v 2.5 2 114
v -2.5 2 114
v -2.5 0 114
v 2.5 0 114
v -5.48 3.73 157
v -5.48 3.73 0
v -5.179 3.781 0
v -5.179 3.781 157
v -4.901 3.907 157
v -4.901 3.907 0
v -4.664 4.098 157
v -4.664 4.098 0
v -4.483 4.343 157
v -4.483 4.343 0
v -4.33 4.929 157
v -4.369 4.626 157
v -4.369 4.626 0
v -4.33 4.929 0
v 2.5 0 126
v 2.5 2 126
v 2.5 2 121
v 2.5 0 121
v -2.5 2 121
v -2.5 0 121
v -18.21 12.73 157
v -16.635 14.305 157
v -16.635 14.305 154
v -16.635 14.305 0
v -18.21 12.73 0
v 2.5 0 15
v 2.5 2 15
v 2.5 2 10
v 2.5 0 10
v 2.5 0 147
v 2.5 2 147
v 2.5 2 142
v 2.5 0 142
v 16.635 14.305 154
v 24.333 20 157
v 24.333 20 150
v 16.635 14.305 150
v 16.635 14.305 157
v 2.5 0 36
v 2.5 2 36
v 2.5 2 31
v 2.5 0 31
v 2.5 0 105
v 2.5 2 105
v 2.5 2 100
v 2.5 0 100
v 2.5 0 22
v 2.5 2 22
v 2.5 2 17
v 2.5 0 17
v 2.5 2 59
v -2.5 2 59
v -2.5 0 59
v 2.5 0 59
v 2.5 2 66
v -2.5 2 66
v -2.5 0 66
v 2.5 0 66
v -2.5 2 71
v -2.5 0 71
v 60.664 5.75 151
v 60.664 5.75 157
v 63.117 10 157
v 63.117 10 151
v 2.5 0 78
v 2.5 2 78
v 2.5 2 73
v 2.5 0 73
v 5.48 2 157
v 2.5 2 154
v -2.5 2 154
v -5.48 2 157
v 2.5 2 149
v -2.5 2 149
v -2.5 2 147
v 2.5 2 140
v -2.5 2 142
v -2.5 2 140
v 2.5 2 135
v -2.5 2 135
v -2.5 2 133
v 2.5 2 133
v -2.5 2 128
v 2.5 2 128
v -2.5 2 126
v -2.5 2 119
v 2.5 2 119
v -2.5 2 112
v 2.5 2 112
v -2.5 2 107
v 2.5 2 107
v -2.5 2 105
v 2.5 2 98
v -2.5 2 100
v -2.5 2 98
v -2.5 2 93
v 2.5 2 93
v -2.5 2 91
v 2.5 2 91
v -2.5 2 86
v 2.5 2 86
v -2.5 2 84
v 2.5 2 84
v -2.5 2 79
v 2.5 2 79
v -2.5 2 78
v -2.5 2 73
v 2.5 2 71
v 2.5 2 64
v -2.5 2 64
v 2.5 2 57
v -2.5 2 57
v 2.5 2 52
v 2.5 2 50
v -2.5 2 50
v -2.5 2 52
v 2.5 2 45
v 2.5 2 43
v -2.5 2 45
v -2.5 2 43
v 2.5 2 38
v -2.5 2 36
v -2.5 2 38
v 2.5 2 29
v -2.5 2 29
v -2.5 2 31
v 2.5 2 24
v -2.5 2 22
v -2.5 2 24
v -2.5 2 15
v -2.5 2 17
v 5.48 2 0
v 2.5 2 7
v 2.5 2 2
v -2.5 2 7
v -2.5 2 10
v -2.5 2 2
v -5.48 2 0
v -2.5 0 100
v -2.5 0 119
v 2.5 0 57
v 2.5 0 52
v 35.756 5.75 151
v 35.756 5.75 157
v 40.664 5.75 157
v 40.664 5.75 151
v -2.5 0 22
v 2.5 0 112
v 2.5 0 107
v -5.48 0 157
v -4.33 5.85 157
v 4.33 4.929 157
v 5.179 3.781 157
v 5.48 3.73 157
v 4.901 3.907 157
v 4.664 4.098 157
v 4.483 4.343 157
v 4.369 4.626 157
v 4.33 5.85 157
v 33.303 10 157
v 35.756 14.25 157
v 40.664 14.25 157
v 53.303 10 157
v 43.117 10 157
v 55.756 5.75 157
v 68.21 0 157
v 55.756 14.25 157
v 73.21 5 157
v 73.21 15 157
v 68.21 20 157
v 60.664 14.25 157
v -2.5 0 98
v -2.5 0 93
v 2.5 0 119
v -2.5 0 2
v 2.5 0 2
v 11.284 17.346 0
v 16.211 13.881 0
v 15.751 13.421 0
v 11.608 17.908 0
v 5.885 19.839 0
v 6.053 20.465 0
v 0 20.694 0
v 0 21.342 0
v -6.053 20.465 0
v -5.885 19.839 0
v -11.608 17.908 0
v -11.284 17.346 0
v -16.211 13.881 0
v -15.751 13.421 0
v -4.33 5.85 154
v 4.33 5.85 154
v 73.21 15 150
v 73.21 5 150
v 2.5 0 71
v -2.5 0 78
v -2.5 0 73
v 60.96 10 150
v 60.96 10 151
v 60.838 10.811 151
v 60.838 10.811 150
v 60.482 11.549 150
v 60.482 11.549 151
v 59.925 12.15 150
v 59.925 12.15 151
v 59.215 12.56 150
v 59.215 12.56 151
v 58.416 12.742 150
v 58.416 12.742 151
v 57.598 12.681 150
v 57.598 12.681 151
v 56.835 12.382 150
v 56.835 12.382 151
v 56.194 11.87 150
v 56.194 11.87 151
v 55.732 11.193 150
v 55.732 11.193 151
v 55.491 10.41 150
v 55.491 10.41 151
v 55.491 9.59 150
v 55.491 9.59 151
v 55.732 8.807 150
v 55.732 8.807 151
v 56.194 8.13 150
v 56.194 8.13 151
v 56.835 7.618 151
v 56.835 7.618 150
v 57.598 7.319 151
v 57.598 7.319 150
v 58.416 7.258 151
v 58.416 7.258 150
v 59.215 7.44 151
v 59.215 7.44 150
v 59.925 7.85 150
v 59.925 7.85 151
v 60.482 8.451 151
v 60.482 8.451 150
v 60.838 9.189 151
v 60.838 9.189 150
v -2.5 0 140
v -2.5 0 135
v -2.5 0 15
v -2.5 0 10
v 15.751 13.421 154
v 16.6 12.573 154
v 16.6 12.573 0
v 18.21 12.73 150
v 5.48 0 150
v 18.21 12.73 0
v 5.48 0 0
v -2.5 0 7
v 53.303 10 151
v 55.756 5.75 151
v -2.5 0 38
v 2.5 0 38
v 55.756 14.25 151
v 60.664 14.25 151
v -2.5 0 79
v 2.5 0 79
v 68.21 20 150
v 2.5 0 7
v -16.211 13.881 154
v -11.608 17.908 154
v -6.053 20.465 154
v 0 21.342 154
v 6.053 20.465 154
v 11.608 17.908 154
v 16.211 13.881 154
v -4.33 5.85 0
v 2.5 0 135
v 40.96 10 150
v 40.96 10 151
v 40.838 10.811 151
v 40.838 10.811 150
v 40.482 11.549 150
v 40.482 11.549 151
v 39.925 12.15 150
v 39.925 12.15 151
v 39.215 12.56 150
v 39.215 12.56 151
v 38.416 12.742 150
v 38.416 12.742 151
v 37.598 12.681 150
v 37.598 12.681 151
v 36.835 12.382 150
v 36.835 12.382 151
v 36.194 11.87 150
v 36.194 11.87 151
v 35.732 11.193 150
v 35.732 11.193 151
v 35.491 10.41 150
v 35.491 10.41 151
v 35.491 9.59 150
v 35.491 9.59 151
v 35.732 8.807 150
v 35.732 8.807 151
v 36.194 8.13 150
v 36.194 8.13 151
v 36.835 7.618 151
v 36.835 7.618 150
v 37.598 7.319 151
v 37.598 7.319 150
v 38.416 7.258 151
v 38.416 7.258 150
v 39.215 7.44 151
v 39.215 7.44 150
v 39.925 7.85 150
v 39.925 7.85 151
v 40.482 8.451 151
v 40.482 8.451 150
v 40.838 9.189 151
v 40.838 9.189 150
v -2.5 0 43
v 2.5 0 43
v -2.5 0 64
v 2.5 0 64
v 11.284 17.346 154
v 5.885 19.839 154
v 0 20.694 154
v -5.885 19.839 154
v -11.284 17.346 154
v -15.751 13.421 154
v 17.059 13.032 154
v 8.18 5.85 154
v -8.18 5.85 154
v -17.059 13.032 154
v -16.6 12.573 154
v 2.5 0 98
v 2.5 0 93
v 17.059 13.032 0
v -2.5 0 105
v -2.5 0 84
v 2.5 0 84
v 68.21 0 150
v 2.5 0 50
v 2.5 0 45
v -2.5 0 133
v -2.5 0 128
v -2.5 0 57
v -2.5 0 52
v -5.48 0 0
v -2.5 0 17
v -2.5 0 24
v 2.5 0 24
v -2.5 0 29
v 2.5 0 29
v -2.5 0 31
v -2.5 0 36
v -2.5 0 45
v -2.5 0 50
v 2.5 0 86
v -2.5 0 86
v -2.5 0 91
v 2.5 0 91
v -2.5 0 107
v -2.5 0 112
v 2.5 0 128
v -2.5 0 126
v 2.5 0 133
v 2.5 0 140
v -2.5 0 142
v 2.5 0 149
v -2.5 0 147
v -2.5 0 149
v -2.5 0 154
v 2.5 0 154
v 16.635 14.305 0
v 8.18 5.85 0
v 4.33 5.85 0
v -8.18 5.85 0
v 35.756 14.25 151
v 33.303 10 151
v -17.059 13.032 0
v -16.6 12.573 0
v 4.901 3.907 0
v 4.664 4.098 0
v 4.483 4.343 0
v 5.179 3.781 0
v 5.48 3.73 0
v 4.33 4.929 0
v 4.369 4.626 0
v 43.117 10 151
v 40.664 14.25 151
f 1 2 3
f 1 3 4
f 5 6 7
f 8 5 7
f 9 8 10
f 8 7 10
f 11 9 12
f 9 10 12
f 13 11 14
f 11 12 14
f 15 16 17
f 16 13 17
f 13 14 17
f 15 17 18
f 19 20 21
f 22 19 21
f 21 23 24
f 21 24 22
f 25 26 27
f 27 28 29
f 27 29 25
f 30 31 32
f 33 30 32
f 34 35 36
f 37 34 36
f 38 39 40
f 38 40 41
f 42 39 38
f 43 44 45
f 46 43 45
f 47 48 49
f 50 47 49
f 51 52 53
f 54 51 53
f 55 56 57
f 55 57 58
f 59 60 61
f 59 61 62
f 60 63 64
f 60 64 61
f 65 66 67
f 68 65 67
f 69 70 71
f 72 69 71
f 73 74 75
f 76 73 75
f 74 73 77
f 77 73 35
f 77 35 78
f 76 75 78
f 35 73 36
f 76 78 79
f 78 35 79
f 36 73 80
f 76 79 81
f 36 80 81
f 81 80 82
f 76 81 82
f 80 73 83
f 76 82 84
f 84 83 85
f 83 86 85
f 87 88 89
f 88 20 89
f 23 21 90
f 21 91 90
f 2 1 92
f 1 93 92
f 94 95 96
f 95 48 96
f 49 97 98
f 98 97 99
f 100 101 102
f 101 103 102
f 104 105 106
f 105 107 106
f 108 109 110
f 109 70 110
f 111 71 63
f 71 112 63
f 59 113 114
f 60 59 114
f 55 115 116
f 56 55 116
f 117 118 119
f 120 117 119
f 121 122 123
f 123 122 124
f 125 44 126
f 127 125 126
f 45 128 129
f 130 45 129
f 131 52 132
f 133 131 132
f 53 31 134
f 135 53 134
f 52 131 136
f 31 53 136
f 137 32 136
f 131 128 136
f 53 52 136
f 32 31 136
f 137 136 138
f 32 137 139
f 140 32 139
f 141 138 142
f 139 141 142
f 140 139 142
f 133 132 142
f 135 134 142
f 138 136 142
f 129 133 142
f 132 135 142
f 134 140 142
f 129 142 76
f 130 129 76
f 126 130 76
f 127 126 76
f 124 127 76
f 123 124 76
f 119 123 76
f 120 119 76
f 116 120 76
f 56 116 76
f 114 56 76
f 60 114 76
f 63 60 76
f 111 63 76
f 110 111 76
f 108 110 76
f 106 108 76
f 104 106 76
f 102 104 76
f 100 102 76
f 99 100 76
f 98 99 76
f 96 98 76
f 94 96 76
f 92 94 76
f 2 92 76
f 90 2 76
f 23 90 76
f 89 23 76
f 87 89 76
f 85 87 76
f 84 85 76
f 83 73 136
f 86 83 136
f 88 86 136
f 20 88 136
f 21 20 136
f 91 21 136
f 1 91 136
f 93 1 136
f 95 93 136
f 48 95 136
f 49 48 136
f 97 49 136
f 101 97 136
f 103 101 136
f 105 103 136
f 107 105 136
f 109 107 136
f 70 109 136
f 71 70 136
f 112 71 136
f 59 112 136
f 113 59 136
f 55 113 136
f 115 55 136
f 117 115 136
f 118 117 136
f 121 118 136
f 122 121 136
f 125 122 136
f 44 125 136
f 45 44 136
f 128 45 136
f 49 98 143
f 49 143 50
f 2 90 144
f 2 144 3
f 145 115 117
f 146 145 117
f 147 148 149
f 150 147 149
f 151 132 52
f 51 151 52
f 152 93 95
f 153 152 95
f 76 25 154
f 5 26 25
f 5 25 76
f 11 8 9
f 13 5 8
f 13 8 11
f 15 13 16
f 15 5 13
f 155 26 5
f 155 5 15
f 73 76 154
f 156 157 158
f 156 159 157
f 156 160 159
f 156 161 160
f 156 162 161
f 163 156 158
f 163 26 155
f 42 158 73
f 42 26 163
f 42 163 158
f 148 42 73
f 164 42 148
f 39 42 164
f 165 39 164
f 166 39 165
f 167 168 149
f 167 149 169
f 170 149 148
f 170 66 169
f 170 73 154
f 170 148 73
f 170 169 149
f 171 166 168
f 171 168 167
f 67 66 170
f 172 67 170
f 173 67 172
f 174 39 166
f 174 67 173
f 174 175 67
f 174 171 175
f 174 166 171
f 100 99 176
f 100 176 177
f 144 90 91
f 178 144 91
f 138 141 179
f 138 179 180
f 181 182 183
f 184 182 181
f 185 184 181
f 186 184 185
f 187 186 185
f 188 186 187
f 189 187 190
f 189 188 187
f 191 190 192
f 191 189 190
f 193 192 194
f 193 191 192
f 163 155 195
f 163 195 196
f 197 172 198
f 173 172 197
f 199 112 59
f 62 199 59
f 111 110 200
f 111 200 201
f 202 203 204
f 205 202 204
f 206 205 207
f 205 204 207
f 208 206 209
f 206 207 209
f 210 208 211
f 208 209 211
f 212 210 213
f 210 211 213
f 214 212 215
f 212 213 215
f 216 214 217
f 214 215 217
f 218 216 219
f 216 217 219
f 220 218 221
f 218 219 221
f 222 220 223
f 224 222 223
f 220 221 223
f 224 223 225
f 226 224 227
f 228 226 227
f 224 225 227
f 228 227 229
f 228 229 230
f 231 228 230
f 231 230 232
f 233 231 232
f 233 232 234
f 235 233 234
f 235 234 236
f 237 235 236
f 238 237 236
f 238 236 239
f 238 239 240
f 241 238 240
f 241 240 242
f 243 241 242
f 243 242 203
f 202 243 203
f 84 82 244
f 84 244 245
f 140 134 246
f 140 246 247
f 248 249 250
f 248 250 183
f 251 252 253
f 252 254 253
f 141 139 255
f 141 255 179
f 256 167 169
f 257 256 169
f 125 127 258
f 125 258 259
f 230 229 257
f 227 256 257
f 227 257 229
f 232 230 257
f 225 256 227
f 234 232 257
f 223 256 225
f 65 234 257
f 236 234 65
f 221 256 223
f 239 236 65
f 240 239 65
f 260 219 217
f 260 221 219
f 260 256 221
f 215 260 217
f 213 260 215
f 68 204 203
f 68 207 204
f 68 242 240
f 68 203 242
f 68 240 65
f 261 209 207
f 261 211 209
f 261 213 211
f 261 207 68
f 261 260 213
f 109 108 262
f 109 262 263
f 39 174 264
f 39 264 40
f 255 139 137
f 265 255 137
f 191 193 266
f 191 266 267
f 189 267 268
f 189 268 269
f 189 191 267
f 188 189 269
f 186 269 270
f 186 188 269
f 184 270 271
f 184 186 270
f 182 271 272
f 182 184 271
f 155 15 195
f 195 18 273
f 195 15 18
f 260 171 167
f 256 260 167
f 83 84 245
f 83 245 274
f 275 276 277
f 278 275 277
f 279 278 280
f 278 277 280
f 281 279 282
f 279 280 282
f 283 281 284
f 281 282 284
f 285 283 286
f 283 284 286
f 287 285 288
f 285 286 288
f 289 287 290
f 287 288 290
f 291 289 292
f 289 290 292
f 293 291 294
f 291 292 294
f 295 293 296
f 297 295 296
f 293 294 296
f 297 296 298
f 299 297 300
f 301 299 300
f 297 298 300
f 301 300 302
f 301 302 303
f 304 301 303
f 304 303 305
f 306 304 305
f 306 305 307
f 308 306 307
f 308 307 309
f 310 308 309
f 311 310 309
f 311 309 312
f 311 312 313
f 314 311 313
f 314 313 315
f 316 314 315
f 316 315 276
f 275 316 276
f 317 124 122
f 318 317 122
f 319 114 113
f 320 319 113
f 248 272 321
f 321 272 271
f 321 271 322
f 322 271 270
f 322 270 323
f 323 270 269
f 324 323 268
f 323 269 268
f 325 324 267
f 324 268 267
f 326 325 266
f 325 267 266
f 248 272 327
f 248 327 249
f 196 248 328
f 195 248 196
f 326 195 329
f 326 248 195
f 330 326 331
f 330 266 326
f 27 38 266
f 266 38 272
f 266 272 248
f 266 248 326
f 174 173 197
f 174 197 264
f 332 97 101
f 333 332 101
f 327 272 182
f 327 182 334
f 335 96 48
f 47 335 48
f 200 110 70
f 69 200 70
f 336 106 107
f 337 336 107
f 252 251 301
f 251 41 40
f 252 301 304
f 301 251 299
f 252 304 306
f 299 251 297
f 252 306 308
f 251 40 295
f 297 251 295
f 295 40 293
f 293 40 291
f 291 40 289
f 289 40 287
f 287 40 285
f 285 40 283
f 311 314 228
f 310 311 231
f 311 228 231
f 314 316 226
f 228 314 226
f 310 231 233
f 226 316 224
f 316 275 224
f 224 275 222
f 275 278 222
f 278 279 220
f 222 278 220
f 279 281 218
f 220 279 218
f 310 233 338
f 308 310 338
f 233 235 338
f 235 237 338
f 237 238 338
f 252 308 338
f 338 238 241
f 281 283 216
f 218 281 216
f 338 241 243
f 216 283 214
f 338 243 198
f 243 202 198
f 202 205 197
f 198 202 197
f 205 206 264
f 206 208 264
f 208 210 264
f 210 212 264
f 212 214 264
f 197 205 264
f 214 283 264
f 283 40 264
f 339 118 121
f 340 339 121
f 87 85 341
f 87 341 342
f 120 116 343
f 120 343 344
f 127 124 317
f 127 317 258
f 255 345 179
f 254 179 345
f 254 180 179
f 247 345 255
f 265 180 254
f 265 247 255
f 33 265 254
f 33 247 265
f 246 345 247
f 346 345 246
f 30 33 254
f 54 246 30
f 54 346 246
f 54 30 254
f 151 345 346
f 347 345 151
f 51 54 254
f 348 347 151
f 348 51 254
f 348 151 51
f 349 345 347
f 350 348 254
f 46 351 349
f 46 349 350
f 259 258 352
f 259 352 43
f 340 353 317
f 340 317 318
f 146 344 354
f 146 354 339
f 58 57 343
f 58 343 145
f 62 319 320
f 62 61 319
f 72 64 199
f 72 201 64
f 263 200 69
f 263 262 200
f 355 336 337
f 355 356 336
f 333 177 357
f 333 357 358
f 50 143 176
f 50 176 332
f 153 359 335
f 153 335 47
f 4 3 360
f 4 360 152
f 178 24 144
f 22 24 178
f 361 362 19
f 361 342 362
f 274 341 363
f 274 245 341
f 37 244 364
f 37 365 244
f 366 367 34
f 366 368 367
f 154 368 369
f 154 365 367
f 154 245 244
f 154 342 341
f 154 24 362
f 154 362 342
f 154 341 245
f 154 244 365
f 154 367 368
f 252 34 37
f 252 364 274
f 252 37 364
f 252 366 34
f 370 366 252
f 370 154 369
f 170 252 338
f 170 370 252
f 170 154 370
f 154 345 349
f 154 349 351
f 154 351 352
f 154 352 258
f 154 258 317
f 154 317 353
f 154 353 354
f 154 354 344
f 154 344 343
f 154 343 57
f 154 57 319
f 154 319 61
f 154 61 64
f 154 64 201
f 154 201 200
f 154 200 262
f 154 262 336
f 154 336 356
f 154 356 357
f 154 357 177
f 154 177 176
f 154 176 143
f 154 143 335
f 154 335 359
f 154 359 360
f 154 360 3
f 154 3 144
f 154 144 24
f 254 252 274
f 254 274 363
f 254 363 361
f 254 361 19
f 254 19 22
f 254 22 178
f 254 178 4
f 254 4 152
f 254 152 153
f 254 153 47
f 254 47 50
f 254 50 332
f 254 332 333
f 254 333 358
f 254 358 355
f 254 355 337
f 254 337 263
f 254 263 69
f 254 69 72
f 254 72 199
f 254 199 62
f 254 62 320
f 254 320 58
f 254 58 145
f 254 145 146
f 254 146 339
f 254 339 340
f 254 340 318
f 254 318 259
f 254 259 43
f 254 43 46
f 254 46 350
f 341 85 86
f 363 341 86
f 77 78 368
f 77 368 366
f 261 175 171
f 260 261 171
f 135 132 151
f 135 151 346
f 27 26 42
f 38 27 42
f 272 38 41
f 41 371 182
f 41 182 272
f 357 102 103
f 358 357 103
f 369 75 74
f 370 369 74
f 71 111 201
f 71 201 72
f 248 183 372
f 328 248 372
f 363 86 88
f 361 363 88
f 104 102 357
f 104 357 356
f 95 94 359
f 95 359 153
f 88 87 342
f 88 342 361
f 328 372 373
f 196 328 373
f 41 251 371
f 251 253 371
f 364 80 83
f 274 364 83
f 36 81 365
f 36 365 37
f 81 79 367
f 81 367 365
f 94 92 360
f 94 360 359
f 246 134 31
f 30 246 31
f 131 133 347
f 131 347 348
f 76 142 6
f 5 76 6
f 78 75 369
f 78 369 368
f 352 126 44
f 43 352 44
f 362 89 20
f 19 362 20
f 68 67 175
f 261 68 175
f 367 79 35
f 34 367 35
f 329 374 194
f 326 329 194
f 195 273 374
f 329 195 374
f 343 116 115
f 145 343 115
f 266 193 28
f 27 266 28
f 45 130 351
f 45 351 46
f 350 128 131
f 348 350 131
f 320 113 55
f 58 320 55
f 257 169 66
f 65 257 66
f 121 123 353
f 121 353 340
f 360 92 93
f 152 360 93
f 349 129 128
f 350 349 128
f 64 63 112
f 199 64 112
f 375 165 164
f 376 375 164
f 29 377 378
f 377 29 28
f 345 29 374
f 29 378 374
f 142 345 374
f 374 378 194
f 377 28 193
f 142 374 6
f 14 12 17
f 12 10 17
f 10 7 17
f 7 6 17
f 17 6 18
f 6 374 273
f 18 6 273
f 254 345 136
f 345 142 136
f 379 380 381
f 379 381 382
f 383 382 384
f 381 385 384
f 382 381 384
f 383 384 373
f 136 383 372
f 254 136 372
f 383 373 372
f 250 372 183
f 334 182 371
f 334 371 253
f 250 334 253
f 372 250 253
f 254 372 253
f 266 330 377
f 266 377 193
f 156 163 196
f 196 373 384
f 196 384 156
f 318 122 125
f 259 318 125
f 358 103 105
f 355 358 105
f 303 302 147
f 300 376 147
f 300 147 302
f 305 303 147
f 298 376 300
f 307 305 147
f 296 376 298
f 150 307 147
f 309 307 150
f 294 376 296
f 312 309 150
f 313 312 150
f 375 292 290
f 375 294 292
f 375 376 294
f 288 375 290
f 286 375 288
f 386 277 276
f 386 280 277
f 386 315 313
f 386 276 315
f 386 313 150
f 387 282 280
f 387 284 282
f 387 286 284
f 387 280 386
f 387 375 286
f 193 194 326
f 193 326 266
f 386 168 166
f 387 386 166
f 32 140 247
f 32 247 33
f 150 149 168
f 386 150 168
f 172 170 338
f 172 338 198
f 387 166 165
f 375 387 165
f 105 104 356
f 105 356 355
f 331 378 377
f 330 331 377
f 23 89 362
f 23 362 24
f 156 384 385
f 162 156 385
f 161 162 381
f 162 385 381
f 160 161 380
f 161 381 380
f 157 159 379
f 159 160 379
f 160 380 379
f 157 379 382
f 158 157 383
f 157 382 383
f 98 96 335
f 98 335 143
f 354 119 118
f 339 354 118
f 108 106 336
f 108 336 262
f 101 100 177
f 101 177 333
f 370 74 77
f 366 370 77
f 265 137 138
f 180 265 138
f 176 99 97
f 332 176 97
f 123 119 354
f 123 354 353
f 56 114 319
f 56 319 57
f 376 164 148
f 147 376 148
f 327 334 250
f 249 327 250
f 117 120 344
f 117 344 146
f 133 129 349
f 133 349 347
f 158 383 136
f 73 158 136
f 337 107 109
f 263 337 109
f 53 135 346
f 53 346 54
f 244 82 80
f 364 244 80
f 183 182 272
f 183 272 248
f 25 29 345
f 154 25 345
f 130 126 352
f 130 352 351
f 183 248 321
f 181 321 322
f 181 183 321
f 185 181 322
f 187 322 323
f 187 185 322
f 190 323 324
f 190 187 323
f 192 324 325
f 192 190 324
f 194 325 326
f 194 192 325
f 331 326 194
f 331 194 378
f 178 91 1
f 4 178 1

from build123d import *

# Parameters (mm, degrees)
BOSS_EXTRUDE1_DEPTH = 157
SKETCH2_W           = 5
SKETCH2_H           = 5
CUT_EXTRUDE1_DEPTH  = 157
SKETCH3_W           = 5
SKETCH3_H           = 5
CUT_EXTRUDE2_DEPTH  = 157
FILLET1_R           = 1.2
BOSS_EXTRUDE2_DEPTH = 3
BOSS_EXTRUDE3_DEPTH = 7
SKETCH6_R           = 2.75
CUT_EXTRUDE3_DEPTH  = 175.380916674
CUT_EXTRUDE4_DEPTH  = 6
BOSS_EXTRUDE4_DEPTH = 154


with BuildPart() as part:
    # Sketch1 → Boss-Extrude1 (new body)
    with BuildSketch(Plane.XY):
        Polygon((5.48, 0), (18.21, 12.73), (16.635, 14.305), (16.210735931, 13.880735931), (17.059264069, 13.032207794), (16.599644661, 12.572588386), (15.751116524, 13.421116524), (8.18, 5.85), (4.33, 5.85), (4.33, 3.73), (5.48, 3.73), (5.48, 2), (-5.48, 2), (-5.48, 3.73), (-4.33, 3.73), (-4.33, 5.85), (-8.18, 5.85), (-15.751116524, 13.421116524), (-16.599644661, 12.572588386), (-17.059264069, 13.032207794), (-16.210735931, 13.880735931), (-16.635, 14.305), (-18.21, 12.73), (-5.48, 0), align=None)
    extrude(amount=BOSS_EXTRUDE1_DEPTH)

    # Sketch2 → Cut-Extrude1 (cut)
    with BuildSketch(Plane(origin=(0, 2, 0), x_dir=(1, 0, 0), z_dir=(0, 1, 0))):
        with Locations((0, -4.5)):
            Rectangle(SKETCH2_W, SKETCH2_H)
        with Locations((0, -151.5)):
            Rectangle(SKETCH2_W, SKETCH2_H)
    extrude(amount=-CUT_EXTRUDE1_DEPTH, mode=Mode.SUBTRACT)

    # Sketch3 → Cut-Extrude2 (cut)
    with BuildSketch(Plane(origin=(0, 2, 0), x_dir=(1, 0, 0), z_dir=(0, 1, 0))):
        with Locations((0, -144.5)):
            Rectangle(SKETCH3_W, SKETCH3_H)
        with Locations((0, -137.5)):
            Rectangle(SKETCH3_W, SKETCH3_H)
        with Locations((0, -130.5)):
            Rectangle(SKETCH3_W, SKETCH3_H)
        with Locations((0, -88.5)):
            Rectangle(SKETCH3_W, SKETCH3_H)
        with Locations((0, -81.5)):
            Rectangle(SKETCH3_W, SKETCH3_H)
        with Locations((0, -95.5)):
            Rectangle(SKETCH3_W, SKETCH3_H)
        with Locations((0, -102.5)):
            Rectangle(SKETCH3_W, SKETCH3_H)
        with Locations((0, -109.5)):
            Rectangle(SKETCH3_W, SKETCH3_H)
        with Locations((0, -116.5)):
            Rectangle(SKETCH3_W, SKETCH3_H)
        with Locations((0, -123.5)):
            Rectangle(SKETCH3_W, SKETCH3_H)
        with Locations((0, -33.5)):
            Rectangle(SKETCH3_W, SKETCH3_H)
        with Locations((0, -40.5)):
            Rectangle(SKETCH3_W, SKETCH3_H)
        with Locations((0, -47.5)):
            Rectangle(SKETCH3_W, SKETCH3_H)
        with Locations((0, -54.5)):
            Rectangle(SKETCH3_W, SKETCH3_H)
        with Locations((0, -61.5)):
            Rectangle(SKETCH3_W, SKETCH3_H)
        with Locations((0, -75.5)):
            Rectangle(SKETCH3_W, SKETCH3_H)
        with Locations((0, -68.5)):
            Rectangle(SKETCH3_W, SKETCH3_H)
        with Locations((0, -26.5)):
            Rectangle(SKETCH3_W, SKETCH3_H)
        with Locations((0, -19.5)):
            Rectangle(SKETCH3_W, SKETCH3_H)
        with Locations((0, -12.5)):
            Rectangle(SKETCH3_W, SKETCH3_H)
    extrude(amount=-CUT_EXTRUDE2_DEPTH, mode=Mode.SUBTRACT)

    # Fillet1
    # the kernel refuses this fillet: 1.2 mm, written as the material it takes off along each edge
    with BuildSketch(Plane(origin=(4.33, 3.73, -2.997394702), x_dir=(0, 1, 0), z_dir=(0, 0, 1))) as fillet1_piece_1:
        with BuildLine():
            CenterArc((1.198957881, -1.2), FILLET1_R, 90, 87.611984537)
            Line((0, -1.15), (-0.023979158, -1.149))
            ThreePointArc((-0.023979158, -1.149), (-0.024, -0.575), (-0.024, 0))
            Line((-0.024, 0), (0, 0.024))
            Line((0, 0.024), (1.198957881, 0.024))
            Line((1.198957881, 0.024), (1.198957881, 0))
        make_face()
    extrude(amount=162.994789404, mode=Mode.SUBTRACT)
    with BuildSketch(Plane(origin=(-4.33, 3.73, -2.997394702), x_dir=(-1, 0, 0), z_dir=(0, 0, 1))) as fillet1_piece_2:
        with BuildLine():
            CenterArc((1.2, -1.198957881), FILLET1_R, 92.388015463, 87.611984537)
            Line((0, -1.198957881), (-0.024, -1.198957881))
            Line((-0.024, -1.198957881), (-0.024, 0))
            Line((-0.024, 0), (0, 0.024))
            ThreePointArc((0, 0.024), (0.575, 0.024), (1.149, 0.023979158))
            Line((1.149, 0.023979158), (1.15, 0))
        make_face()
    extrude(amount=162.994789404, mode=Mode.SUBTRACT)

    # Sketch4 → Boss-Extrude2 (add)
    with BuildSketch(Plane.XY.offset(157)):
        Polygon((-16.635, 14.305), (16.635, 14.305), (18.21, 12.73), (5.48, 0), (-5.48, 0), (-18.21, 12.73), align=None)
        with BuildLine():
            Line((-5.48, 5.85), (5.48, 5.85))
            ThreePointArc((5.48, 5.85), (7.405, 3.925), (5.48, 2))
            Line((5.48, 2), (-5.48, 2))
            ThreePointArc((-5.48, 2), (-7.405, 3.925), (-5.48, 5.85))
        make_face(mode=Mode.SUBTRACT)
    extrude(amount=-BOSS_EXTRUDE2_DEPTH)

    # Sketch5 → Boss-Extrude3 (add)
    with BuildSketch(Plane.XY.offset(157)):
        with BuildLine():
            Line((23.21, 0), (68.21, 0))
            Line((68.21, 0), (73.21, 5))
            Line((73.21, 5), (73.21, 15))
            Line((73.21, 15), (68.21, 20))
            Line((68.21, 20), (24.333330784, 20))
            Line((24.333330784, 20), (16.635, 14.305))
            ThreePointArc((16.635, 14.305), (17.363929946, 13.458929946), (18.21, 12.73))
            Line((18.21, 12.73), (5.48, 0))
            Line((5.48, 0), (23.21, 0))
        make_face()
    extrude(amount=-BOSS_EXTRUDE3_DEPTH)

    # Sketch6 → Cut-Extrude3 (cut, through all)
    with BuildSketch(Plane.XY.offset(157)):
        with Locations((38.21, 10)):
            Circle(SKETCH6_R)
        with Locations((58.21, 10)):
            Circle(SKETCH6_R)
    extrude(amount=-CUT_EXTRUDE3_DEPTH, mode=Mode.SUBTRACT)

    # Sketch7 → Cut-Extrude4 (cut)
    with BuildSketch(Plane.XY.offset(157)):
        Polygon((43.117477288, 10), (40.663738644, 14.25), (35.756261356, 14.25), (33.302522712, 10), (35.756261356, 5.75), (40.663738644, 5.75), align=None)
        Polygon((63.117477288, 10), (60.663738644, 14.25), (55.756261356, 14.25), (53.302522712, 10), (55.756261356, 5.75), (60.663738644, 5.75), align=None)
    extrude(amount=-CUT_EXTRUDE4_DEPTH, mode=Mode.SUBTRACT)


with BuildPart() as body_2:
    # Sketch8 → Boss-Extrude4 (new body)
    with BuildSketch(Plane(origin=(0, 0, 0), x_dir=(-1, 0, 0), z_dir=(0, 0, -1))):
        with BuildLine():
            Line((15.751116524, 13.421116524), (16.210735931, 13.880735931))
            ThreePointArc((16.210735931, 13.880735931), (0, 21.341574202), (-16.210735931, 13.880735931))
            Line((-16.210735931, 13.880735931), (-15.751116524, 13.421116524))
            ThreePointArc((-15.751116524, 13.421116524), (0, 20.69357486), (15.751116524, 13.421116524))
        make_face()
    extrude(amount=-BOSS_EXTRUDE4_DEPTH)


solid = Compound([part.part, body_2.part])
